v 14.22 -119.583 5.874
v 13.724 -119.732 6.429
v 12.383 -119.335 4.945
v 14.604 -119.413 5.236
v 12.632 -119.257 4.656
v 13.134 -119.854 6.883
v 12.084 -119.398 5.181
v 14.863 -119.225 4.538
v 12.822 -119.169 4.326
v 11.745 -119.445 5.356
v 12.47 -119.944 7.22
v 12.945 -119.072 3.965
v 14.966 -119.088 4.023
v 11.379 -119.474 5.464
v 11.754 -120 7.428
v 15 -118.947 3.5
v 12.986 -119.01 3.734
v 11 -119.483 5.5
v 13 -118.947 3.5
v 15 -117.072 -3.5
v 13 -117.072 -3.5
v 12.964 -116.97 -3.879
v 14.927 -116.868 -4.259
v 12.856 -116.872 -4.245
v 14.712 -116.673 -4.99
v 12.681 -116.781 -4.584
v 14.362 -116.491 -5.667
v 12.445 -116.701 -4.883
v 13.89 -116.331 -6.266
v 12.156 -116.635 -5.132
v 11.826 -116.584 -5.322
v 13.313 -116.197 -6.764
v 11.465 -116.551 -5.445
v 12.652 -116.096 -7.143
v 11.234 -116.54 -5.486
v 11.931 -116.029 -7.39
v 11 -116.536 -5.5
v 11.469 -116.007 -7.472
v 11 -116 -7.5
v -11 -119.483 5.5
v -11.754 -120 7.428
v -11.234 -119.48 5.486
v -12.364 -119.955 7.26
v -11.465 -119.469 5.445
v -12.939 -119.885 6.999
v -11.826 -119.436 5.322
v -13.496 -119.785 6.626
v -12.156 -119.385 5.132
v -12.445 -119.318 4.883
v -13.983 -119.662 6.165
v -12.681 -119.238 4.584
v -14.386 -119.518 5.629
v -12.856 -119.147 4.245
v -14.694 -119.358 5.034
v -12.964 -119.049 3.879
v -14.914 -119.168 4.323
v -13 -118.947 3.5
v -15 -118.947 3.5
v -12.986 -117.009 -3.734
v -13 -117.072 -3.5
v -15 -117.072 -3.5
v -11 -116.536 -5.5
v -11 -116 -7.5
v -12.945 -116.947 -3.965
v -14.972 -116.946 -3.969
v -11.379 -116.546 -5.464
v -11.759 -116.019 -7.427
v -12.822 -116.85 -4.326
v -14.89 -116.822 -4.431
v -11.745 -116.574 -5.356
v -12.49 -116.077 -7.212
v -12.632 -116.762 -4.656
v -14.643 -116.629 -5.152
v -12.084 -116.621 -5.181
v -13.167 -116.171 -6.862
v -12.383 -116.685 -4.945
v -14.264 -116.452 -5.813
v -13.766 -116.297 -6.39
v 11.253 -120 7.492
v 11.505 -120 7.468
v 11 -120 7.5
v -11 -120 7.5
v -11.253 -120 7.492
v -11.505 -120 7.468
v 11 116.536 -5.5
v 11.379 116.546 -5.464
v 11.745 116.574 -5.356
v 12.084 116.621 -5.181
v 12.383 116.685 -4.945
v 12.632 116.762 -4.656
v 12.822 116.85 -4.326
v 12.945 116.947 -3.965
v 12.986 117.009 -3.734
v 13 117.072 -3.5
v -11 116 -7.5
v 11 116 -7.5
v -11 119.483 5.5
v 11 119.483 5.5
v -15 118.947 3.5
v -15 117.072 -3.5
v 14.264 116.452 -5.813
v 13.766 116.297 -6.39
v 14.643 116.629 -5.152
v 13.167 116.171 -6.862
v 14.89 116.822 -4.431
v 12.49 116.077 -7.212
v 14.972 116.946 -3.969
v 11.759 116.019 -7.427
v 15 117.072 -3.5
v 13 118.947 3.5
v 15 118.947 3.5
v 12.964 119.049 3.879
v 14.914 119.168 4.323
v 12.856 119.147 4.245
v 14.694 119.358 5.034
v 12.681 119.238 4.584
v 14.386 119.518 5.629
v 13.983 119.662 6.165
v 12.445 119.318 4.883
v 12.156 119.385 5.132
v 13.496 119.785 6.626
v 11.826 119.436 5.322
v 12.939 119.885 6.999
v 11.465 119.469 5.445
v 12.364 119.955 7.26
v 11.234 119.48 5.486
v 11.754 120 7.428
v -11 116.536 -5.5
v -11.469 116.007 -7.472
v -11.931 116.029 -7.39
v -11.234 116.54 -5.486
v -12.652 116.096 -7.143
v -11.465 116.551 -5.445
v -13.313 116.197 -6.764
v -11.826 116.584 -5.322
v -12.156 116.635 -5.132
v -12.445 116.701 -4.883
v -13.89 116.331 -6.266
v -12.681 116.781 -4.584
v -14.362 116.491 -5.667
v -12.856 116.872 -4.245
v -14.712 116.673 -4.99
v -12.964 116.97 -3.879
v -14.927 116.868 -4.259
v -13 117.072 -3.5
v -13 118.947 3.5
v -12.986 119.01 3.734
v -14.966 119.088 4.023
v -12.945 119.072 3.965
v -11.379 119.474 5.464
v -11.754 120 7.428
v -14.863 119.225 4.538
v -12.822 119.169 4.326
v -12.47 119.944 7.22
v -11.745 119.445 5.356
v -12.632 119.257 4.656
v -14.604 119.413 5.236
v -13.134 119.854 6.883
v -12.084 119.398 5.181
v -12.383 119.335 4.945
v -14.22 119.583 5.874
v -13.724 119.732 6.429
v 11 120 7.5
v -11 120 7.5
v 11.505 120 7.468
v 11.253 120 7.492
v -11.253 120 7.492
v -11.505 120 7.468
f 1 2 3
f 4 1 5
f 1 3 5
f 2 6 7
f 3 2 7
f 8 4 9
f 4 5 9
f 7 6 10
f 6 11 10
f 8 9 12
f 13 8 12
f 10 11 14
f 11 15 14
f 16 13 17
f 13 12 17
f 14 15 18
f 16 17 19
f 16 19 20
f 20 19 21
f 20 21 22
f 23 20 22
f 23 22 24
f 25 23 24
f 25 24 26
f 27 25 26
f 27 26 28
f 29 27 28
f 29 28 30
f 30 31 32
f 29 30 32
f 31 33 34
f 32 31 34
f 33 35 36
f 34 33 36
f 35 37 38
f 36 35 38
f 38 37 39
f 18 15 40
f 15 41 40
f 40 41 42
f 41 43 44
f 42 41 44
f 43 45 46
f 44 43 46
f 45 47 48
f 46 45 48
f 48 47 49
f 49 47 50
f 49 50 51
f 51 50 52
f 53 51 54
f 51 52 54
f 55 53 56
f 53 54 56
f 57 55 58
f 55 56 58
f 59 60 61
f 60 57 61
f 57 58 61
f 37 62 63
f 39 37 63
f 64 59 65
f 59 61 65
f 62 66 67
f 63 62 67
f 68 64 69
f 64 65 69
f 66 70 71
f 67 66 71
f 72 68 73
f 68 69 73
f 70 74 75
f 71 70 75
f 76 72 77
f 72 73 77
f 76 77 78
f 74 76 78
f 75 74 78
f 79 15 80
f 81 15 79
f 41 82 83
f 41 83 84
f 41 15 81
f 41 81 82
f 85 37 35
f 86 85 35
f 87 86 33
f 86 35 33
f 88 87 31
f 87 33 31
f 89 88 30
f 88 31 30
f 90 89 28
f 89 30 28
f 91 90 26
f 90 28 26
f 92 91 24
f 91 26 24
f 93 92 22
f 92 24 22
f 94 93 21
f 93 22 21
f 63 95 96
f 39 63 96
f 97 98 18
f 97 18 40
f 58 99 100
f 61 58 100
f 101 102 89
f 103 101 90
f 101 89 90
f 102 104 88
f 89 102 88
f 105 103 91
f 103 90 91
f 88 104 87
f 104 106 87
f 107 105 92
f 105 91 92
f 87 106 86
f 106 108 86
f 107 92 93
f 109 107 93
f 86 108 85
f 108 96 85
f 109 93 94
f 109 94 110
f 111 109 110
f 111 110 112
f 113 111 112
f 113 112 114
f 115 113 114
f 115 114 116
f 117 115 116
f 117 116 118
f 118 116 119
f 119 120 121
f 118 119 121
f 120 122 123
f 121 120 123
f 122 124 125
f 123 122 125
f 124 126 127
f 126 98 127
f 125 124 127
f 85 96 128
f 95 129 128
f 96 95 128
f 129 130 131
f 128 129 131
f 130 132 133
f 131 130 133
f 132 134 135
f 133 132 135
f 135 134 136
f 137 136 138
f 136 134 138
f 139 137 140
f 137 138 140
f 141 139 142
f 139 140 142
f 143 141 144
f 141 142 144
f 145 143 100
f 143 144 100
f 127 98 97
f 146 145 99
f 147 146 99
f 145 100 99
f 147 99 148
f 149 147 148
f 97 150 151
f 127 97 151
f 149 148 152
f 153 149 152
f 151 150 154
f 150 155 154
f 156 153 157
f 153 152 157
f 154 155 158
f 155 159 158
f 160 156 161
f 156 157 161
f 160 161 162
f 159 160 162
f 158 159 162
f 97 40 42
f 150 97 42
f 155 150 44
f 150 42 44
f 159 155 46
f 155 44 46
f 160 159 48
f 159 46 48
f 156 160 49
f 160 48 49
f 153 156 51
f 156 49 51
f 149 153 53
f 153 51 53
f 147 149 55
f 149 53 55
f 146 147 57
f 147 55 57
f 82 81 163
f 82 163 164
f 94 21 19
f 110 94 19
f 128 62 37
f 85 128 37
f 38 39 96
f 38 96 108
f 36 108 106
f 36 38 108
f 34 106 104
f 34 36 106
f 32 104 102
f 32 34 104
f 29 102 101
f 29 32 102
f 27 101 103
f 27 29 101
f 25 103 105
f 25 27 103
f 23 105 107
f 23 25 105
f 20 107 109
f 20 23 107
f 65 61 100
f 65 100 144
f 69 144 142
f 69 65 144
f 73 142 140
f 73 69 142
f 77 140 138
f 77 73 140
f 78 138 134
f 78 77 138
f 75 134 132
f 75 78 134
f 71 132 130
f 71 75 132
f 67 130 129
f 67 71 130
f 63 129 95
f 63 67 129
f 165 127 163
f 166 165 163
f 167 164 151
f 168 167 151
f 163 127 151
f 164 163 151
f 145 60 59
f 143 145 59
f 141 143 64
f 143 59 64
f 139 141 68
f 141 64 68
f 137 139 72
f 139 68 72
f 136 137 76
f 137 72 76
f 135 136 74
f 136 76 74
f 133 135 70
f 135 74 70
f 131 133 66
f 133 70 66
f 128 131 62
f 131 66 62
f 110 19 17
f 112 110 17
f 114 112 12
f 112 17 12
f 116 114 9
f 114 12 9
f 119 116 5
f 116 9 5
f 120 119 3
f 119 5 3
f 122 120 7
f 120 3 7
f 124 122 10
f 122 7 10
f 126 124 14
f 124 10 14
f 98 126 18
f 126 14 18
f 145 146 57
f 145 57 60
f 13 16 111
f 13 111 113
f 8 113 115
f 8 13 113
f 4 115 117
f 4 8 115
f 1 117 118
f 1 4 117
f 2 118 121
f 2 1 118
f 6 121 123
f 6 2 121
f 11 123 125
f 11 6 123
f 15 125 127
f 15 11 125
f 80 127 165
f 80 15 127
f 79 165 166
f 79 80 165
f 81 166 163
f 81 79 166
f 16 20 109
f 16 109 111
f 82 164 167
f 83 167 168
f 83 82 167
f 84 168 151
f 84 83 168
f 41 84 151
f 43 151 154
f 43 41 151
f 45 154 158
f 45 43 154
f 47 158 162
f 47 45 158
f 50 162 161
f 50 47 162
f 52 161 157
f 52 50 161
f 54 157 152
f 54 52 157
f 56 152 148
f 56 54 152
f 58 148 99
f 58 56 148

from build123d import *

# Parameters (mm, degrees)
EXTRUDE_1_DEPTH      = 120
EXTRUDE_1_DEPTH_BACK = 120
CHAMFER_1_SIZE       = 4
CHAMFER_1_SIZE_2     = 14.92820323


with BuildPart() as part:
    # Эскиз1 → Вытянуть-Тонкостенный1 (new, two sides: drawn at the far end of the back side and taken through both)
    with BuildSketch(Plane(origin=(0, 0, 0), x_dir=(1, 0, 0), z_dir=(0, 1, 0)).offset(-EXTRUDE_1_DEPTH_BACK)):
        with BuildLine():
            Line((-11, 7.5), (11, 7.5))
            ThreePointArc((11, 7.5), (13.828427125, 6.328427125), (15, 3.5))
            Line((15, 3.5), (15, -3.5))
            ThreePointArc((15, -3.5), (13.828427125, -6.328427125), (11, -7.5))
            Line((11, -7.5), (-11, -7.5))
            ThreePointArc((-11, -7.5), (-13.828427125, -6.328427125), (-15, -3.5))
            Line((-15, -3.5), (-15, 3.5))
            ThreePointArc((-15, 3.5), (-13.828427125, 6.328427125), (-11, 7.5))
        make_face()
        with BuildLine():
            Line((-11, 5.5), (11, 5.5))
            ThreePointArc((11, 5.5), (12.414213562, 4.914213562), (13, 3.5))
            Line((13, 3.5), (13, -3.5))
            ThreePointArc((13, -3.5), (12.414213562, -4.914213562), (11, -5.5))
            Line((11, -5.5), (-11, -5.5))
            ThreePointArc((-11, -5.5), (-12.414213562, -4.914213562), (-13, -3.5))
            Line((-13, -3.5), (-13, 3.5))
            ThreePointArc((-13, 3.5), (-12.414213562, 4.914213562), (-11, 5.5))
        make_face(mode=Mode.SUBTRACT)
    extrude(amount=EXTRUDE_1_DEPTH + EXTRUDE_1_DEPTH_BACK)

    # Фаска1
    # the kernel refuses this chamfer: 14.92820323, 4 mm, written as the material it takes off along each edge
    with BuildSketch(Plane(origin=(-49.764387332, 120, -7.5), x_dir=(0, -0.990500038825954, -0.1375124470212912), z_dir=(1, 0, 0))) as chamfer_1_piece_1:
        Polygon((CHAMFER_1_SIZE * 0.990500038826, -CHAMFER_1_SIZE * 0.137512447021), (-CHAMFER_1_SIZE_2 * 0.137512447024, -CHAMFER_1_SIZE_2 * 0.990500038844), (0, 0), align=None)
    extrude(amount=99.528774665, mode=Mode.SUBTRACT)
    with BuildSketch(Plane(origin=(-49.764387332, -120, -7.5), x_dir=(0, -0.009967146577155871, 0.9999503267608394), z_dir=(1, 0, 0))) as chamfer_1_piece_2:
        Polygon((CHAMFER_1_SIZE_2 * 0.999950326779, -CHAMFER_1_SIZE_2 * 0.00996714657734), (-CHAMFER_1_SIZE * 0.00996714657716, -CHAMFER_1_SIZE * 0.999950326761), (0, 0), align=None)
    extrude(amount=99.528774665, mode=Mode.SUBTRACT)


solid = part.part
